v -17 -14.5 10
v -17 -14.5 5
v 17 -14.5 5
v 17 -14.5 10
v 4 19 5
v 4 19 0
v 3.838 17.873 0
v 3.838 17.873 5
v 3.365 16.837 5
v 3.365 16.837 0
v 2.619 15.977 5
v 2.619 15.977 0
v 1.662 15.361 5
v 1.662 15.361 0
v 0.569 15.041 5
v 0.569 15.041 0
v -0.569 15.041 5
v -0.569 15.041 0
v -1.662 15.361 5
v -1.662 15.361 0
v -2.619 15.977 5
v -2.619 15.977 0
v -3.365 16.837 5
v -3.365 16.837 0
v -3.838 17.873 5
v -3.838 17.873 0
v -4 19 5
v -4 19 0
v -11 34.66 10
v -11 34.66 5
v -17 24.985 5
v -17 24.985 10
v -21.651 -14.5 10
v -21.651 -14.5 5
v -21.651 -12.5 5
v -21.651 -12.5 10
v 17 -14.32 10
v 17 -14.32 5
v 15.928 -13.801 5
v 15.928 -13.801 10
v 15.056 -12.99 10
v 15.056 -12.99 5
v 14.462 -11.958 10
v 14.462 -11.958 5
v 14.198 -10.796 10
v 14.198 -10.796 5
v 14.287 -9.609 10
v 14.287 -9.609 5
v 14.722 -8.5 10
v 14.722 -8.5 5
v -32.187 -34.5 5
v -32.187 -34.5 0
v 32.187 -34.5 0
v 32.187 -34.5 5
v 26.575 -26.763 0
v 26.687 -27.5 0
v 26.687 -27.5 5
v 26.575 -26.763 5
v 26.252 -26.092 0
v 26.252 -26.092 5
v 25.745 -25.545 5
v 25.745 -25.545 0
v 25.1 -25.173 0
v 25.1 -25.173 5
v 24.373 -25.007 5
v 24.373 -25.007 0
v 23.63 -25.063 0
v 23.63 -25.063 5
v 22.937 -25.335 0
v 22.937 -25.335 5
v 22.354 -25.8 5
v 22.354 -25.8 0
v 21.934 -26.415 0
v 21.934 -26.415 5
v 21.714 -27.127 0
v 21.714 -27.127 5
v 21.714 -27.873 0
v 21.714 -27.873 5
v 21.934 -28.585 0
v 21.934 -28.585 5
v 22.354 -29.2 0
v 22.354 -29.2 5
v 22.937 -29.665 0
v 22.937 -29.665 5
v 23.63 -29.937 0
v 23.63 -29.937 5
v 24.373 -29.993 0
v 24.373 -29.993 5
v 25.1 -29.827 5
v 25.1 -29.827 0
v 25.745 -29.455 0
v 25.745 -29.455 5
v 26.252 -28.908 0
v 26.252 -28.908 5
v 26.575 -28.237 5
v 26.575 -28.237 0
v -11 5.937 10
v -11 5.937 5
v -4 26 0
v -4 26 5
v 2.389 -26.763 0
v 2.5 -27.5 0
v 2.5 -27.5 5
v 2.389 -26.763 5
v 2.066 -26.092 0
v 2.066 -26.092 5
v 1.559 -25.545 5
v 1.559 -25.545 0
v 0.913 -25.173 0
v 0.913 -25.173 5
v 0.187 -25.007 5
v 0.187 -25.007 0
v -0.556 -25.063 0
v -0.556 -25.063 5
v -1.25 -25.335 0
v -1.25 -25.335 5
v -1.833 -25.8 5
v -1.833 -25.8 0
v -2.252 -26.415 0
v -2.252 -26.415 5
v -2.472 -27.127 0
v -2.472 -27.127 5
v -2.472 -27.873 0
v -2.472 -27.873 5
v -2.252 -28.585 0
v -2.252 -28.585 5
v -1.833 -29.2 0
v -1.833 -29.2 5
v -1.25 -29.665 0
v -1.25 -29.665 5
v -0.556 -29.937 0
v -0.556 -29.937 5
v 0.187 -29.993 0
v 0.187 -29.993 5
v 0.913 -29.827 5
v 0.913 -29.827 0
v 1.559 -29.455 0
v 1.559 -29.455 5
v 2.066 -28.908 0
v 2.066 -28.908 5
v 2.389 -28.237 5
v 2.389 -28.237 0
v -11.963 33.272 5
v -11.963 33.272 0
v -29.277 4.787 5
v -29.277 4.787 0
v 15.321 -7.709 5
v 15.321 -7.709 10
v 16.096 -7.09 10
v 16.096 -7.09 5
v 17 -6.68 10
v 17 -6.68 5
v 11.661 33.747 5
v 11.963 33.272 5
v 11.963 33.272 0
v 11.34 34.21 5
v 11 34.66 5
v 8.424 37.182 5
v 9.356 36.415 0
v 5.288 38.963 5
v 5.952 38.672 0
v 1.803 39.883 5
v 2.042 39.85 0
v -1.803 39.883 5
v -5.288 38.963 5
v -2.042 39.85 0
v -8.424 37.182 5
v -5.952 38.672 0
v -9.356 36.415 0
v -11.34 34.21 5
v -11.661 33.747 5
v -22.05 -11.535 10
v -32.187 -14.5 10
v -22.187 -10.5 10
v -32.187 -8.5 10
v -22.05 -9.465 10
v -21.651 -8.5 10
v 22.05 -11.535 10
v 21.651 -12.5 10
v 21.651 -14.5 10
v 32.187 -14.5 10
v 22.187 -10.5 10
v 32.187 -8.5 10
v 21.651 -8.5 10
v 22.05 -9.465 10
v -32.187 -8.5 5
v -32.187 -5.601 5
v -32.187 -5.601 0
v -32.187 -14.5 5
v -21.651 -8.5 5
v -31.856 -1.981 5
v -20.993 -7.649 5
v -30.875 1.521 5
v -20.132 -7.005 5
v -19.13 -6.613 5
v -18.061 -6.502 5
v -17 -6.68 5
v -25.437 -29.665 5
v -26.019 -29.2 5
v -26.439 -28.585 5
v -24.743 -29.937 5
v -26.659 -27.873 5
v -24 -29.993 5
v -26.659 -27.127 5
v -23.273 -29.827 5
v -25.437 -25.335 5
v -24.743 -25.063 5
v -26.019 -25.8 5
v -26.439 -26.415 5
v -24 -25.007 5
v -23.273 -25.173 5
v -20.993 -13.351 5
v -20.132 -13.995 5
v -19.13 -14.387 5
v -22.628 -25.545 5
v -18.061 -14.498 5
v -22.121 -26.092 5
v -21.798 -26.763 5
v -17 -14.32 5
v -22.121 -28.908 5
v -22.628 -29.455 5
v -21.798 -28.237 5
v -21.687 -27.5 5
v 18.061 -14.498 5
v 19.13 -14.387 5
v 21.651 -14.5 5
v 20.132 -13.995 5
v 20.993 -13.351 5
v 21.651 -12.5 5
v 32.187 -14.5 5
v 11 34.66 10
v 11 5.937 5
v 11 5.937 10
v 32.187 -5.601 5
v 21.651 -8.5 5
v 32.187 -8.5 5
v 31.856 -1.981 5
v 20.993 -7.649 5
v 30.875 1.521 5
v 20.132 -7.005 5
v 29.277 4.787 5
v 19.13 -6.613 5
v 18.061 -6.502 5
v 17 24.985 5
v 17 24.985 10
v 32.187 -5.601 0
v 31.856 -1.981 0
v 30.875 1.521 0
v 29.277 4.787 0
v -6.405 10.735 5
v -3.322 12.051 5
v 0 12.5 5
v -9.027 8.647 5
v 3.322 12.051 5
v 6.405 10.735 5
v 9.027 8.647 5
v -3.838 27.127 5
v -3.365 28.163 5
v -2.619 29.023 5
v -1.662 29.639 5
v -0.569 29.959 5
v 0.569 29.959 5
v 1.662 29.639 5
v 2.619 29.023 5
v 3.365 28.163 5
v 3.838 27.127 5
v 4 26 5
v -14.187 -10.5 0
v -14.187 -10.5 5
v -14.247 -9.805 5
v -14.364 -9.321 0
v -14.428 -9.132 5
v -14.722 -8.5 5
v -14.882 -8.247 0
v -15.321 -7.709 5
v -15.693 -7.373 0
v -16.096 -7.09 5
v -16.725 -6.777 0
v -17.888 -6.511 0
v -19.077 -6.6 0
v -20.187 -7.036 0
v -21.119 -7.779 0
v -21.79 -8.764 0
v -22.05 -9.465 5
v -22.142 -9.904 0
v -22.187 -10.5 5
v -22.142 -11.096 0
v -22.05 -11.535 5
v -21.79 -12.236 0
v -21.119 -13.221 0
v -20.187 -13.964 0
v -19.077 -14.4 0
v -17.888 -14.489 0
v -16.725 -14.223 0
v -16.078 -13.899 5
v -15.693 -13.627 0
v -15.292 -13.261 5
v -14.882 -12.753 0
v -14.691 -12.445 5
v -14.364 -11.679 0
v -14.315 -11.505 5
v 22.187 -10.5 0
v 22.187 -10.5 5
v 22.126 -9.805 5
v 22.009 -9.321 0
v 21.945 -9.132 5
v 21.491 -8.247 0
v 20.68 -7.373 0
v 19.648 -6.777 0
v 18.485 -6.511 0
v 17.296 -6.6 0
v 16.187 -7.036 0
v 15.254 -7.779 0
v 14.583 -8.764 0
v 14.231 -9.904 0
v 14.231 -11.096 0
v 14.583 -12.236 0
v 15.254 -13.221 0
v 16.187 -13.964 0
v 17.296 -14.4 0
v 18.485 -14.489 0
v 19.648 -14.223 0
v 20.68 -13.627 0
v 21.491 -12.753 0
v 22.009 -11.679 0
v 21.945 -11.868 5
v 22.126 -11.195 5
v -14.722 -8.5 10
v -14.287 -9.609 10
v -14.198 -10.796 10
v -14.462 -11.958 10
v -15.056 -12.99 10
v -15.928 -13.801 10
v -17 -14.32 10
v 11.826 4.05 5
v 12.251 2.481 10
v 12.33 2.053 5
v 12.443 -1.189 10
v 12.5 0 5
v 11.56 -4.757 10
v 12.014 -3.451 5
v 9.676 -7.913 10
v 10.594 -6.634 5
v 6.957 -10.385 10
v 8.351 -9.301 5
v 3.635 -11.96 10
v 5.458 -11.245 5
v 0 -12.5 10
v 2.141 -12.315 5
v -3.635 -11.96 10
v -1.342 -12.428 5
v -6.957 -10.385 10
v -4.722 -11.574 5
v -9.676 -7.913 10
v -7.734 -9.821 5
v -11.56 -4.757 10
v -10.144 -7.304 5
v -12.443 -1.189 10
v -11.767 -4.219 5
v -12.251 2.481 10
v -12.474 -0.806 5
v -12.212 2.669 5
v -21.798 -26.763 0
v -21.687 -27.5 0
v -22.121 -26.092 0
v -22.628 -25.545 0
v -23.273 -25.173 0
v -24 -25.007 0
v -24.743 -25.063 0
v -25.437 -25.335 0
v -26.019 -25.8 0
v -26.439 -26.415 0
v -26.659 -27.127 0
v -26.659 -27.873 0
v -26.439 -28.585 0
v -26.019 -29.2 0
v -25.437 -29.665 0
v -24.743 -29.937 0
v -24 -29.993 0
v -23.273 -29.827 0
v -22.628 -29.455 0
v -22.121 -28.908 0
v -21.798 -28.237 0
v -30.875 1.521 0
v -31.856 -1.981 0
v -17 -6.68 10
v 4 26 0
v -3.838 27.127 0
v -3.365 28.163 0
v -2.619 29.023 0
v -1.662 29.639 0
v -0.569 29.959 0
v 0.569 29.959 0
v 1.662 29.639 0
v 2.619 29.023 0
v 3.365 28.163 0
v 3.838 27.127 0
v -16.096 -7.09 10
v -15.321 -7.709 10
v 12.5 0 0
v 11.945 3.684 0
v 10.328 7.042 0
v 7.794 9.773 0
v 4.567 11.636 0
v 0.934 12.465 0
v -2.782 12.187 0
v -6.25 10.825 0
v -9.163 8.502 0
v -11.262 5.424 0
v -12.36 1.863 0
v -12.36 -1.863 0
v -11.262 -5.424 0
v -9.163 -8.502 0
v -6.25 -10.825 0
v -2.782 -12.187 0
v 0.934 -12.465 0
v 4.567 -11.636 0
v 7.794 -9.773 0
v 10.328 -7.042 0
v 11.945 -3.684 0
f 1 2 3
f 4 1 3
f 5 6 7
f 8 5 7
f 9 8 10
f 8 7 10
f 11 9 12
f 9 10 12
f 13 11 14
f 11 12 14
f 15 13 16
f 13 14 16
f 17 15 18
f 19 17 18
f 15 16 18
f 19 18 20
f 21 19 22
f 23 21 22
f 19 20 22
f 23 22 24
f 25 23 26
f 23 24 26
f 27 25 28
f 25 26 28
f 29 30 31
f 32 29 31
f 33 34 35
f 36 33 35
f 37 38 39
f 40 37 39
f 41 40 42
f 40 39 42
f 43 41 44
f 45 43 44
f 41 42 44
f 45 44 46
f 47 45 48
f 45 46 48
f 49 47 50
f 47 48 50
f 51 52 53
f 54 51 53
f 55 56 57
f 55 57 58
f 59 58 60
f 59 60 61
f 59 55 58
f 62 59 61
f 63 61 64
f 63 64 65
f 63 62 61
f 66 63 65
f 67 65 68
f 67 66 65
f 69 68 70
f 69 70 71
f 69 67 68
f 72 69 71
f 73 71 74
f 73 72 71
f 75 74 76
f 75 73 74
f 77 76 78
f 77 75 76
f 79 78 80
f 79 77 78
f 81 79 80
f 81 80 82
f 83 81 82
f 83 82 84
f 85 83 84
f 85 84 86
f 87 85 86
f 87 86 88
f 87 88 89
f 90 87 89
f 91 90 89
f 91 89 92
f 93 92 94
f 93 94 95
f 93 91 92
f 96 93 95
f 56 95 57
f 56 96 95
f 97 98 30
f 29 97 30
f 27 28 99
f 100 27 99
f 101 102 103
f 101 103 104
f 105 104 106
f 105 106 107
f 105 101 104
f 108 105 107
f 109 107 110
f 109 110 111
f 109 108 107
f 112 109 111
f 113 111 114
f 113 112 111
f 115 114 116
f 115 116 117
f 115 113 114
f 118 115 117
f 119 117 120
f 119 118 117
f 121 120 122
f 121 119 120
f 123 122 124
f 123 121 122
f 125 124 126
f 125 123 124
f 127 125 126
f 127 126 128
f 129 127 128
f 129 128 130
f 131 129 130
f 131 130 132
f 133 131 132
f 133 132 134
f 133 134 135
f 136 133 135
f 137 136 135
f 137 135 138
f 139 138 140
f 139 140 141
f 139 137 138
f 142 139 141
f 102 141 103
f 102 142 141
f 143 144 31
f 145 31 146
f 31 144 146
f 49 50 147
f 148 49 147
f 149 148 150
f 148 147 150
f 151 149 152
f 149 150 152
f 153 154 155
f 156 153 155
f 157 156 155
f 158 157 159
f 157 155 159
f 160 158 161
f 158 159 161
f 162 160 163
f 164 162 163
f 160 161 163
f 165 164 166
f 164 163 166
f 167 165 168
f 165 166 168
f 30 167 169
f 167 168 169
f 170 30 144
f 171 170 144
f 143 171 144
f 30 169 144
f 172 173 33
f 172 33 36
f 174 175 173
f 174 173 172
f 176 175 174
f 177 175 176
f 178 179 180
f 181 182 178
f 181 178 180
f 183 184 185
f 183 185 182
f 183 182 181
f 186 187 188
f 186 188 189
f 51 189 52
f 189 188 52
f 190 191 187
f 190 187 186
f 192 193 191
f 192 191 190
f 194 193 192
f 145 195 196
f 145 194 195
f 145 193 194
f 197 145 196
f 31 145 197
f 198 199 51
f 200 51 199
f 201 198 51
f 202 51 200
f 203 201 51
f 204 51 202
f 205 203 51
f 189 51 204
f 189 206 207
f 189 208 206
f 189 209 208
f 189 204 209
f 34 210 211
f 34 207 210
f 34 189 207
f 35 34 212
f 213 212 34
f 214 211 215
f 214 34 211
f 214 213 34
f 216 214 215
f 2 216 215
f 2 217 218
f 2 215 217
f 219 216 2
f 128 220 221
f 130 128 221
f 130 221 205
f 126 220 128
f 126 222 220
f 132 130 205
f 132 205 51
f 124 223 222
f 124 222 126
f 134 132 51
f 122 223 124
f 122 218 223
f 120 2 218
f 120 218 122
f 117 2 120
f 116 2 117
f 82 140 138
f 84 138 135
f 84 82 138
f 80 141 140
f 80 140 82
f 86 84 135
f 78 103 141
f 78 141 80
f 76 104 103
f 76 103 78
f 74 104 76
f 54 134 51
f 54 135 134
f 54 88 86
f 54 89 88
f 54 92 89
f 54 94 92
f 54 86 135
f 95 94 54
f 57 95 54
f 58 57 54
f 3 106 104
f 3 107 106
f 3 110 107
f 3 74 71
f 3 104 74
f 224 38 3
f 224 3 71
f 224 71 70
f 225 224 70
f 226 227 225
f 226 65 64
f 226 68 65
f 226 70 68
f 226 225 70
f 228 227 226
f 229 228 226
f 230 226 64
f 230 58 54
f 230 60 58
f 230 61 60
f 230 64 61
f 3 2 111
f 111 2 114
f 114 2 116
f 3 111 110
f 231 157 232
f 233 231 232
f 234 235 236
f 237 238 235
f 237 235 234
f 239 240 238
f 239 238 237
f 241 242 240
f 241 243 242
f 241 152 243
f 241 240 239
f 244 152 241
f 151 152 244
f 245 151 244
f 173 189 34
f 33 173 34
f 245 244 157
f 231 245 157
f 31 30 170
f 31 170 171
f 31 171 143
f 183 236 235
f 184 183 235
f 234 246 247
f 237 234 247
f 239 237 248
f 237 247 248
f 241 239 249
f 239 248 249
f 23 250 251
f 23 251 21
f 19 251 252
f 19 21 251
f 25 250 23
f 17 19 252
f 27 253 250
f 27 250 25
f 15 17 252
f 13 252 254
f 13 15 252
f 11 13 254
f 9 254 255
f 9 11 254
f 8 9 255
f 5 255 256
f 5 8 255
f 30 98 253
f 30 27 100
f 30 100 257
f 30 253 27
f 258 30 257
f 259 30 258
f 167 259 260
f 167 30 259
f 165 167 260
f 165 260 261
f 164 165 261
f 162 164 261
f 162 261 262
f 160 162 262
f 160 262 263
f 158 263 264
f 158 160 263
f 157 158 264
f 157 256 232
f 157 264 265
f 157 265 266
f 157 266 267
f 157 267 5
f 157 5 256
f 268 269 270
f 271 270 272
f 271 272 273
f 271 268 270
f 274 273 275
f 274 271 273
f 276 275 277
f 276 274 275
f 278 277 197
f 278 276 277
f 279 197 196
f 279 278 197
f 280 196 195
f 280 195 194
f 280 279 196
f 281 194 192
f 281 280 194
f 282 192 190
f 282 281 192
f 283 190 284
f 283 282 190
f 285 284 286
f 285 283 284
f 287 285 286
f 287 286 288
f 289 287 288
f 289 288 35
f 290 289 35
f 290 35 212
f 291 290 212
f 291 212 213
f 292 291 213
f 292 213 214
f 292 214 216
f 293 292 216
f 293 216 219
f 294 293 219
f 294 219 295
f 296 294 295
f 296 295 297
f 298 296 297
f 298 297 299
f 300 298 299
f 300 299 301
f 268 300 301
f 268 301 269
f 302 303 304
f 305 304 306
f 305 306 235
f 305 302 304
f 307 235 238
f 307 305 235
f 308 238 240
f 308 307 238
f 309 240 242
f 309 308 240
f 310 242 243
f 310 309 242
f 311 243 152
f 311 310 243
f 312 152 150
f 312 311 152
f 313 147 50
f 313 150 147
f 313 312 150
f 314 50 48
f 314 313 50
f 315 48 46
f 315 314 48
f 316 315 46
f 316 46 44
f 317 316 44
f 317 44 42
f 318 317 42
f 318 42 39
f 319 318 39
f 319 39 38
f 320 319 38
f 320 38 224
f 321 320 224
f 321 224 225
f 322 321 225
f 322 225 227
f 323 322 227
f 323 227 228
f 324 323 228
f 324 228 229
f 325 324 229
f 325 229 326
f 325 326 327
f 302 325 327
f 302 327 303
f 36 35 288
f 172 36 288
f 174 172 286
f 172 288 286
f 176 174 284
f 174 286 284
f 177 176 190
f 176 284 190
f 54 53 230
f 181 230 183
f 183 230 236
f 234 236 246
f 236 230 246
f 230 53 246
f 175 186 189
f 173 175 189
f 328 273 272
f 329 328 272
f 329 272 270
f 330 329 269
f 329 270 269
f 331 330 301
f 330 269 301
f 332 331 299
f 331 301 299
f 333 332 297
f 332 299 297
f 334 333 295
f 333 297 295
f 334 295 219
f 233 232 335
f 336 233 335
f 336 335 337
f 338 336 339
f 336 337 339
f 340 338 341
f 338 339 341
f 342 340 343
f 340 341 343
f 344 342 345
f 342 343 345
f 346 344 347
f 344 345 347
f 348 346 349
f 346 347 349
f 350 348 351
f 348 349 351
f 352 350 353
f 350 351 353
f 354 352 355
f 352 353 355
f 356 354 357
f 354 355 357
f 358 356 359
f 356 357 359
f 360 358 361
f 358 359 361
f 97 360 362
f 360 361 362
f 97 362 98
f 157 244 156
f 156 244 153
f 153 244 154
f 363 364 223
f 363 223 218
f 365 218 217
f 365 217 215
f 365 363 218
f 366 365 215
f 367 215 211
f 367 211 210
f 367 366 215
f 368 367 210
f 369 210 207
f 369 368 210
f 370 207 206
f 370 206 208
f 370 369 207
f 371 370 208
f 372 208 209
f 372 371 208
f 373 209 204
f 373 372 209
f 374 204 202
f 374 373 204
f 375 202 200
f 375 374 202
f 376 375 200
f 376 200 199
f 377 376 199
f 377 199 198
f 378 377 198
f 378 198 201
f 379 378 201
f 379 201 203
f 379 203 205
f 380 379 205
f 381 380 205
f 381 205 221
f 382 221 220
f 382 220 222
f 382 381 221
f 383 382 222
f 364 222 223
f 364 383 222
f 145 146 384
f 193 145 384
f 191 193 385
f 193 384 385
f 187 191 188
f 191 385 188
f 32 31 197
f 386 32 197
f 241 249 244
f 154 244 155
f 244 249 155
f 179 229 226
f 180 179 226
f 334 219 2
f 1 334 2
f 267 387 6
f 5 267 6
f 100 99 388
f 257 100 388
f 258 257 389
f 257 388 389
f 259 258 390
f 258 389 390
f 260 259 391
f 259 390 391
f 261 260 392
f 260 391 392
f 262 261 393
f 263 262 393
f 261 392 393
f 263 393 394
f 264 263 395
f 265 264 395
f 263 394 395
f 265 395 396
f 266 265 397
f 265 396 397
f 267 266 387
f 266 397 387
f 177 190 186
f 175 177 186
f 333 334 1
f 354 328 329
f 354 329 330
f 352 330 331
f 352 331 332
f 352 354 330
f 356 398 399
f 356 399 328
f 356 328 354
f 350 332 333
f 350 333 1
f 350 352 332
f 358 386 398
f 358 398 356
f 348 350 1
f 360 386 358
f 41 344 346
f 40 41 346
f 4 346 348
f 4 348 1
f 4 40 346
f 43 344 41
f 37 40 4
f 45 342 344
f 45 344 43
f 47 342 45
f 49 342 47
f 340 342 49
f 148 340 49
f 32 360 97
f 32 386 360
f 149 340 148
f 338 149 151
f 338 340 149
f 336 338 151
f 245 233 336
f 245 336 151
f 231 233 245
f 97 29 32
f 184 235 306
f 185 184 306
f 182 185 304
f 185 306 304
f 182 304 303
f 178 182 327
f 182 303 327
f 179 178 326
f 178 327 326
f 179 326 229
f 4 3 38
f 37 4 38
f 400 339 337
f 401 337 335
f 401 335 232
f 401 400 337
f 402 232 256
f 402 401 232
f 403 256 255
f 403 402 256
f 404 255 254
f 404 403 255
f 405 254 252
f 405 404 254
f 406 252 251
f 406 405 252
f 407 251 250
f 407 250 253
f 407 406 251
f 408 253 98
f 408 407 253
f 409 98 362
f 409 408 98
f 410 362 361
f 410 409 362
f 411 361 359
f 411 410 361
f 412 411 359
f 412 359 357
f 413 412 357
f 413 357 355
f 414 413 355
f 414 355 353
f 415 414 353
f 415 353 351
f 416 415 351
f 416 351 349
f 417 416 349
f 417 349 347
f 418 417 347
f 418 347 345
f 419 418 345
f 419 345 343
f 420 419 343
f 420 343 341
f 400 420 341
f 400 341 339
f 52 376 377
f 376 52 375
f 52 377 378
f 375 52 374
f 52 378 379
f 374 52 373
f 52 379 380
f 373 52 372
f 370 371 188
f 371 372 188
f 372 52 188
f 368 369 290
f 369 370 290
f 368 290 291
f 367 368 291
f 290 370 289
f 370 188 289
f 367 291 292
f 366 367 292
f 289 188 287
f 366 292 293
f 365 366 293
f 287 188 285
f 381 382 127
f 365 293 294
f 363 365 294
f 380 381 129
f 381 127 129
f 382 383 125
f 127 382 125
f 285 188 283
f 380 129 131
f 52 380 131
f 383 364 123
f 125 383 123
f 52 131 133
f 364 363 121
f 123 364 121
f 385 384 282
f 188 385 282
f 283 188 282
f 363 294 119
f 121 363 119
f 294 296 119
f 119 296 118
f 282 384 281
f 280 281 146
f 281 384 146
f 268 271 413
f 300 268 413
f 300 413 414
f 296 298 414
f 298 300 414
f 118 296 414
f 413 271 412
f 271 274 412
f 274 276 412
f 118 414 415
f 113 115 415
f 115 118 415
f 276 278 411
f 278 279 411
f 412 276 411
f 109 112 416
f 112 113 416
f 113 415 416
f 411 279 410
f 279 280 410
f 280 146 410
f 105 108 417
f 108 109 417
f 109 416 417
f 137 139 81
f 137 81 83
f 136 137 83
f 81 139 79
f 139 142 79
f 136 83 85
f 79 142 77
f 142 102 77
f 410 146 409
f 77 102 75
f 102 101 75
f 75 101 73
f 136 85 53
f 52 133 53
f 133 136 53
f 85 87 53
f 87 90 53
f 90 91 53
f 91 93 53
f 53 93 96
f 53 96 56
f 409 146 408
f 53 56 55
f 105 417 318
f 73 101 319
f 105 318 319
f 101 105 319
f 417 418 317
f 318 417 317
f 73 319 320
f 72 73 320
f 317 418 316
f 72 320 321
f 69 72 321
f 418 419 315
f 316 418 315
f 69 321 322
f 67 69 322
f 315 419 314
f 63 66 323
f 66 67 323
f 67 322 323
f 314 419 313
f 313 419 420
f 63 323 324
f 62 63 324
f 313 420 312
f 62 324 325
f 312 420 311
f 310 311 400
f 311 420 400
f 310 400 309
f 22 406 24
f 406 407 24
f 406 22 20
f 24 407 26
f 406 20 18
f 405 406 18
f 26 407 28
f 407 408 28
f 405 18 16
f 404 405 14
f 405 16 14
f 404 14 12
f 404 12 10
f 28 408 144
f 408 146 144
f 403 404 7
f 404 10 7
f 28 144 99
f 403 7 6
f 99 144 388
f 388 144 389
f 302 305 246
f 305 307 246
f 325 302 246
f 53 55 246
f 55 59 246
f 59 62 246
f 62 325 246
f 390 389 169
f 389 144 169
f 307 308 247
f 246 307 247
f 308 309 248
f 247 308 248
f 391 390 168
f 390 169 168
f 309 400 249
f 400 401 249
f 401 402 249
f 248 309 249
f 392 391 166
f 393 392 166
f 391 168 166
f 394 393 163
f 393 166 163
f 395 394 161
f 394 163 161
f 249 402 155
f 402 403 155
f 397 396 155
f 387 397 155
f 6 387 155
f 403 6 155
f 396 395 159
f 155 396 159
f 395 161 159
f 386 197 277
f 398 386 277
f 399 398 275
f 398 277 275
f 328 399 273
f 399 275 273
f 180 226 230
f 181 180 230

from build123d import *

# Parameters (mm, degrees)
F0_R     = 2.5
F0_R_2   = 4
F0_R_3   = 12.5
F1_DEPTH = 5
F3_DEPTH = 5


# Not quite as in the source:
# - after a boolean that leaves OpenCascade's solid faulty, fix() repairs it


with BuildPart() as f1:
    # F0 (on Top) → F1 (new body)
    with BuildSketch(Plane.XY):
        with BuildLine():
            Line((-32.1865334795, -5.601415029), (-32.1865334795, -34.5))
            Line((-32.1865334795, -34.5), (32.1865334795, -34.5))
            Line((32.1865334795, -34.5), (32.1865334795, -5.601415029))
            ThreePointArc((32.1865334795, -5.601415029), (31.4454600423, -0.2075529944), (29.2771587146, 4.7865842524))
            Line((29.2771587146, 4.7865842524), (11.9634376646, 33.271599497))
            ThreePointArc((11.9634376646, 33.271599497), (0, 40), (-11.9634376646, 33.271599497))
            Line((-11.9634376646, 33.271599497), (-29.2771587146, 4.7865842524))
            ThreePointArc((-29.2771587146, 4.7865842524), (-31.4454600423, -0.2075529944), (-32.1865334795, -5.601415029))
        make_face()
        with Locations((-24.1865334795, -27.5)):
            Circle(F0_R, mode=Mode.SUBTRACT)
        with Locations((-18.1865334795, -10.5)):
            Circle(F0_R_2, mode=Mode.SUBTRACT)
        with Locations((0, -27.5)):
            Circle(F0_R, mode=Mode.SUBTRACT)
        with Locations((24.1865334795, -27.5)):
            Circle(F0_R, mode=Mode.SUBTRACT)
        Circle(F0_R_3, mode=Mode.SUBTRACT)
        with Locations((18.1865334795, -10.5)):
            Circle(F0_R_2, mode=Mode.SUBTRACT)
        with BuildLine():
            Line((-4, 21), (-4, 26))
            ThreePointArc((-4, 26), (0, 30), (4, 26))
            Line((4, 26), (4, 21))
            Line((4, 21), (4, 19))
            ThreePointArc((4, 19), (0, 15), (-4, 19))
            Line((-4, 19), (-4, 21))
        make_face(mode=Mode.SUBTRACT)
    extrude(amount=F1_DEPTH)

    # F2 (on face) → F3 (join)
    with BuildSketch(Plane.XY.offset(5)):
        with BuildLine():
            Line((-32.1865334795, -8.5), (-32.1865334795, -14.5))
            Line((-32.1865334795, -14.5), (-21.6506350946, -14.5))
            Line((-21.6506350946, -14.5), (-21.6506350946, -12.5))
            ThreePointArc((-21.6506350946, -12.5), (-22.1865334795, -10.5), (-21.6506350946, -8.5))
            Line((-21.6506350946, -8.5), (-32.1865334795, -8.5))
        make_face()
        with BuildLine():
            Line((21.6506350946, -14.5), (32.1865334795, -14.5))
            Line((32.1865334795, -14.5), (32.1865334795, -8.5))
            Line((32.1865334795, -8.5), (21.6506350946, -8.5))
            ThreePointArc((21.6506350946, -8.5), (22.1865334795, -10.5), (21.6506350946, -12.5))
            Line((21.6506350946, -12.5), (21.6506350946, -14.5))
        make_face()
        with BuildLine():
            ThreePointArc((17, -14.3199657462), (14.4616036791, -11.9577029816), (14.7224318643, -8.5))
            ThreePointArc((14.7224318643, -8.5), (15.6895011358, -7.3751272866), (17, -6.6800342538))
            Line((17, -6.6800342538), (17, 24.9853071114))
            Line((17, 24.9853071114), (11, 34.6602540378))
            Line((11, 34.6602540378), (11, 5.9371710435))
            ThreePointArc((11, 5.9371710435), (0, -12.5), (-11, 5.9371710435))
            Line((-11, 5.9371710435), (-11, 34.6602540378))
            Line((-11, 34.6602540378), (-17, 24.9853071114))
            Line((-17, 24.9853071114), (-17, -6.6800342538))
            ThreePointArc((-17, -6.6800342538), (-15.6895011358, -7.3751272866), (-14.7224318643, -8.5))
            ThreePointArc((-14.7224318643, -8.5), (-14.4616036791, -11.9577029816), (-17, -14.3199657462))
            Line((-17, -14.3199657462), (-17, -14.5))
            Line((-17, -14.5), (17, -14.5))
            Line((17, -14.5), (17, -14.3199657462))
        make_face()
    extrude(amount=F3_DEPTH)

    add(f1.part.fix(), mode=Mode.REPLACE)


solid = f1.part
